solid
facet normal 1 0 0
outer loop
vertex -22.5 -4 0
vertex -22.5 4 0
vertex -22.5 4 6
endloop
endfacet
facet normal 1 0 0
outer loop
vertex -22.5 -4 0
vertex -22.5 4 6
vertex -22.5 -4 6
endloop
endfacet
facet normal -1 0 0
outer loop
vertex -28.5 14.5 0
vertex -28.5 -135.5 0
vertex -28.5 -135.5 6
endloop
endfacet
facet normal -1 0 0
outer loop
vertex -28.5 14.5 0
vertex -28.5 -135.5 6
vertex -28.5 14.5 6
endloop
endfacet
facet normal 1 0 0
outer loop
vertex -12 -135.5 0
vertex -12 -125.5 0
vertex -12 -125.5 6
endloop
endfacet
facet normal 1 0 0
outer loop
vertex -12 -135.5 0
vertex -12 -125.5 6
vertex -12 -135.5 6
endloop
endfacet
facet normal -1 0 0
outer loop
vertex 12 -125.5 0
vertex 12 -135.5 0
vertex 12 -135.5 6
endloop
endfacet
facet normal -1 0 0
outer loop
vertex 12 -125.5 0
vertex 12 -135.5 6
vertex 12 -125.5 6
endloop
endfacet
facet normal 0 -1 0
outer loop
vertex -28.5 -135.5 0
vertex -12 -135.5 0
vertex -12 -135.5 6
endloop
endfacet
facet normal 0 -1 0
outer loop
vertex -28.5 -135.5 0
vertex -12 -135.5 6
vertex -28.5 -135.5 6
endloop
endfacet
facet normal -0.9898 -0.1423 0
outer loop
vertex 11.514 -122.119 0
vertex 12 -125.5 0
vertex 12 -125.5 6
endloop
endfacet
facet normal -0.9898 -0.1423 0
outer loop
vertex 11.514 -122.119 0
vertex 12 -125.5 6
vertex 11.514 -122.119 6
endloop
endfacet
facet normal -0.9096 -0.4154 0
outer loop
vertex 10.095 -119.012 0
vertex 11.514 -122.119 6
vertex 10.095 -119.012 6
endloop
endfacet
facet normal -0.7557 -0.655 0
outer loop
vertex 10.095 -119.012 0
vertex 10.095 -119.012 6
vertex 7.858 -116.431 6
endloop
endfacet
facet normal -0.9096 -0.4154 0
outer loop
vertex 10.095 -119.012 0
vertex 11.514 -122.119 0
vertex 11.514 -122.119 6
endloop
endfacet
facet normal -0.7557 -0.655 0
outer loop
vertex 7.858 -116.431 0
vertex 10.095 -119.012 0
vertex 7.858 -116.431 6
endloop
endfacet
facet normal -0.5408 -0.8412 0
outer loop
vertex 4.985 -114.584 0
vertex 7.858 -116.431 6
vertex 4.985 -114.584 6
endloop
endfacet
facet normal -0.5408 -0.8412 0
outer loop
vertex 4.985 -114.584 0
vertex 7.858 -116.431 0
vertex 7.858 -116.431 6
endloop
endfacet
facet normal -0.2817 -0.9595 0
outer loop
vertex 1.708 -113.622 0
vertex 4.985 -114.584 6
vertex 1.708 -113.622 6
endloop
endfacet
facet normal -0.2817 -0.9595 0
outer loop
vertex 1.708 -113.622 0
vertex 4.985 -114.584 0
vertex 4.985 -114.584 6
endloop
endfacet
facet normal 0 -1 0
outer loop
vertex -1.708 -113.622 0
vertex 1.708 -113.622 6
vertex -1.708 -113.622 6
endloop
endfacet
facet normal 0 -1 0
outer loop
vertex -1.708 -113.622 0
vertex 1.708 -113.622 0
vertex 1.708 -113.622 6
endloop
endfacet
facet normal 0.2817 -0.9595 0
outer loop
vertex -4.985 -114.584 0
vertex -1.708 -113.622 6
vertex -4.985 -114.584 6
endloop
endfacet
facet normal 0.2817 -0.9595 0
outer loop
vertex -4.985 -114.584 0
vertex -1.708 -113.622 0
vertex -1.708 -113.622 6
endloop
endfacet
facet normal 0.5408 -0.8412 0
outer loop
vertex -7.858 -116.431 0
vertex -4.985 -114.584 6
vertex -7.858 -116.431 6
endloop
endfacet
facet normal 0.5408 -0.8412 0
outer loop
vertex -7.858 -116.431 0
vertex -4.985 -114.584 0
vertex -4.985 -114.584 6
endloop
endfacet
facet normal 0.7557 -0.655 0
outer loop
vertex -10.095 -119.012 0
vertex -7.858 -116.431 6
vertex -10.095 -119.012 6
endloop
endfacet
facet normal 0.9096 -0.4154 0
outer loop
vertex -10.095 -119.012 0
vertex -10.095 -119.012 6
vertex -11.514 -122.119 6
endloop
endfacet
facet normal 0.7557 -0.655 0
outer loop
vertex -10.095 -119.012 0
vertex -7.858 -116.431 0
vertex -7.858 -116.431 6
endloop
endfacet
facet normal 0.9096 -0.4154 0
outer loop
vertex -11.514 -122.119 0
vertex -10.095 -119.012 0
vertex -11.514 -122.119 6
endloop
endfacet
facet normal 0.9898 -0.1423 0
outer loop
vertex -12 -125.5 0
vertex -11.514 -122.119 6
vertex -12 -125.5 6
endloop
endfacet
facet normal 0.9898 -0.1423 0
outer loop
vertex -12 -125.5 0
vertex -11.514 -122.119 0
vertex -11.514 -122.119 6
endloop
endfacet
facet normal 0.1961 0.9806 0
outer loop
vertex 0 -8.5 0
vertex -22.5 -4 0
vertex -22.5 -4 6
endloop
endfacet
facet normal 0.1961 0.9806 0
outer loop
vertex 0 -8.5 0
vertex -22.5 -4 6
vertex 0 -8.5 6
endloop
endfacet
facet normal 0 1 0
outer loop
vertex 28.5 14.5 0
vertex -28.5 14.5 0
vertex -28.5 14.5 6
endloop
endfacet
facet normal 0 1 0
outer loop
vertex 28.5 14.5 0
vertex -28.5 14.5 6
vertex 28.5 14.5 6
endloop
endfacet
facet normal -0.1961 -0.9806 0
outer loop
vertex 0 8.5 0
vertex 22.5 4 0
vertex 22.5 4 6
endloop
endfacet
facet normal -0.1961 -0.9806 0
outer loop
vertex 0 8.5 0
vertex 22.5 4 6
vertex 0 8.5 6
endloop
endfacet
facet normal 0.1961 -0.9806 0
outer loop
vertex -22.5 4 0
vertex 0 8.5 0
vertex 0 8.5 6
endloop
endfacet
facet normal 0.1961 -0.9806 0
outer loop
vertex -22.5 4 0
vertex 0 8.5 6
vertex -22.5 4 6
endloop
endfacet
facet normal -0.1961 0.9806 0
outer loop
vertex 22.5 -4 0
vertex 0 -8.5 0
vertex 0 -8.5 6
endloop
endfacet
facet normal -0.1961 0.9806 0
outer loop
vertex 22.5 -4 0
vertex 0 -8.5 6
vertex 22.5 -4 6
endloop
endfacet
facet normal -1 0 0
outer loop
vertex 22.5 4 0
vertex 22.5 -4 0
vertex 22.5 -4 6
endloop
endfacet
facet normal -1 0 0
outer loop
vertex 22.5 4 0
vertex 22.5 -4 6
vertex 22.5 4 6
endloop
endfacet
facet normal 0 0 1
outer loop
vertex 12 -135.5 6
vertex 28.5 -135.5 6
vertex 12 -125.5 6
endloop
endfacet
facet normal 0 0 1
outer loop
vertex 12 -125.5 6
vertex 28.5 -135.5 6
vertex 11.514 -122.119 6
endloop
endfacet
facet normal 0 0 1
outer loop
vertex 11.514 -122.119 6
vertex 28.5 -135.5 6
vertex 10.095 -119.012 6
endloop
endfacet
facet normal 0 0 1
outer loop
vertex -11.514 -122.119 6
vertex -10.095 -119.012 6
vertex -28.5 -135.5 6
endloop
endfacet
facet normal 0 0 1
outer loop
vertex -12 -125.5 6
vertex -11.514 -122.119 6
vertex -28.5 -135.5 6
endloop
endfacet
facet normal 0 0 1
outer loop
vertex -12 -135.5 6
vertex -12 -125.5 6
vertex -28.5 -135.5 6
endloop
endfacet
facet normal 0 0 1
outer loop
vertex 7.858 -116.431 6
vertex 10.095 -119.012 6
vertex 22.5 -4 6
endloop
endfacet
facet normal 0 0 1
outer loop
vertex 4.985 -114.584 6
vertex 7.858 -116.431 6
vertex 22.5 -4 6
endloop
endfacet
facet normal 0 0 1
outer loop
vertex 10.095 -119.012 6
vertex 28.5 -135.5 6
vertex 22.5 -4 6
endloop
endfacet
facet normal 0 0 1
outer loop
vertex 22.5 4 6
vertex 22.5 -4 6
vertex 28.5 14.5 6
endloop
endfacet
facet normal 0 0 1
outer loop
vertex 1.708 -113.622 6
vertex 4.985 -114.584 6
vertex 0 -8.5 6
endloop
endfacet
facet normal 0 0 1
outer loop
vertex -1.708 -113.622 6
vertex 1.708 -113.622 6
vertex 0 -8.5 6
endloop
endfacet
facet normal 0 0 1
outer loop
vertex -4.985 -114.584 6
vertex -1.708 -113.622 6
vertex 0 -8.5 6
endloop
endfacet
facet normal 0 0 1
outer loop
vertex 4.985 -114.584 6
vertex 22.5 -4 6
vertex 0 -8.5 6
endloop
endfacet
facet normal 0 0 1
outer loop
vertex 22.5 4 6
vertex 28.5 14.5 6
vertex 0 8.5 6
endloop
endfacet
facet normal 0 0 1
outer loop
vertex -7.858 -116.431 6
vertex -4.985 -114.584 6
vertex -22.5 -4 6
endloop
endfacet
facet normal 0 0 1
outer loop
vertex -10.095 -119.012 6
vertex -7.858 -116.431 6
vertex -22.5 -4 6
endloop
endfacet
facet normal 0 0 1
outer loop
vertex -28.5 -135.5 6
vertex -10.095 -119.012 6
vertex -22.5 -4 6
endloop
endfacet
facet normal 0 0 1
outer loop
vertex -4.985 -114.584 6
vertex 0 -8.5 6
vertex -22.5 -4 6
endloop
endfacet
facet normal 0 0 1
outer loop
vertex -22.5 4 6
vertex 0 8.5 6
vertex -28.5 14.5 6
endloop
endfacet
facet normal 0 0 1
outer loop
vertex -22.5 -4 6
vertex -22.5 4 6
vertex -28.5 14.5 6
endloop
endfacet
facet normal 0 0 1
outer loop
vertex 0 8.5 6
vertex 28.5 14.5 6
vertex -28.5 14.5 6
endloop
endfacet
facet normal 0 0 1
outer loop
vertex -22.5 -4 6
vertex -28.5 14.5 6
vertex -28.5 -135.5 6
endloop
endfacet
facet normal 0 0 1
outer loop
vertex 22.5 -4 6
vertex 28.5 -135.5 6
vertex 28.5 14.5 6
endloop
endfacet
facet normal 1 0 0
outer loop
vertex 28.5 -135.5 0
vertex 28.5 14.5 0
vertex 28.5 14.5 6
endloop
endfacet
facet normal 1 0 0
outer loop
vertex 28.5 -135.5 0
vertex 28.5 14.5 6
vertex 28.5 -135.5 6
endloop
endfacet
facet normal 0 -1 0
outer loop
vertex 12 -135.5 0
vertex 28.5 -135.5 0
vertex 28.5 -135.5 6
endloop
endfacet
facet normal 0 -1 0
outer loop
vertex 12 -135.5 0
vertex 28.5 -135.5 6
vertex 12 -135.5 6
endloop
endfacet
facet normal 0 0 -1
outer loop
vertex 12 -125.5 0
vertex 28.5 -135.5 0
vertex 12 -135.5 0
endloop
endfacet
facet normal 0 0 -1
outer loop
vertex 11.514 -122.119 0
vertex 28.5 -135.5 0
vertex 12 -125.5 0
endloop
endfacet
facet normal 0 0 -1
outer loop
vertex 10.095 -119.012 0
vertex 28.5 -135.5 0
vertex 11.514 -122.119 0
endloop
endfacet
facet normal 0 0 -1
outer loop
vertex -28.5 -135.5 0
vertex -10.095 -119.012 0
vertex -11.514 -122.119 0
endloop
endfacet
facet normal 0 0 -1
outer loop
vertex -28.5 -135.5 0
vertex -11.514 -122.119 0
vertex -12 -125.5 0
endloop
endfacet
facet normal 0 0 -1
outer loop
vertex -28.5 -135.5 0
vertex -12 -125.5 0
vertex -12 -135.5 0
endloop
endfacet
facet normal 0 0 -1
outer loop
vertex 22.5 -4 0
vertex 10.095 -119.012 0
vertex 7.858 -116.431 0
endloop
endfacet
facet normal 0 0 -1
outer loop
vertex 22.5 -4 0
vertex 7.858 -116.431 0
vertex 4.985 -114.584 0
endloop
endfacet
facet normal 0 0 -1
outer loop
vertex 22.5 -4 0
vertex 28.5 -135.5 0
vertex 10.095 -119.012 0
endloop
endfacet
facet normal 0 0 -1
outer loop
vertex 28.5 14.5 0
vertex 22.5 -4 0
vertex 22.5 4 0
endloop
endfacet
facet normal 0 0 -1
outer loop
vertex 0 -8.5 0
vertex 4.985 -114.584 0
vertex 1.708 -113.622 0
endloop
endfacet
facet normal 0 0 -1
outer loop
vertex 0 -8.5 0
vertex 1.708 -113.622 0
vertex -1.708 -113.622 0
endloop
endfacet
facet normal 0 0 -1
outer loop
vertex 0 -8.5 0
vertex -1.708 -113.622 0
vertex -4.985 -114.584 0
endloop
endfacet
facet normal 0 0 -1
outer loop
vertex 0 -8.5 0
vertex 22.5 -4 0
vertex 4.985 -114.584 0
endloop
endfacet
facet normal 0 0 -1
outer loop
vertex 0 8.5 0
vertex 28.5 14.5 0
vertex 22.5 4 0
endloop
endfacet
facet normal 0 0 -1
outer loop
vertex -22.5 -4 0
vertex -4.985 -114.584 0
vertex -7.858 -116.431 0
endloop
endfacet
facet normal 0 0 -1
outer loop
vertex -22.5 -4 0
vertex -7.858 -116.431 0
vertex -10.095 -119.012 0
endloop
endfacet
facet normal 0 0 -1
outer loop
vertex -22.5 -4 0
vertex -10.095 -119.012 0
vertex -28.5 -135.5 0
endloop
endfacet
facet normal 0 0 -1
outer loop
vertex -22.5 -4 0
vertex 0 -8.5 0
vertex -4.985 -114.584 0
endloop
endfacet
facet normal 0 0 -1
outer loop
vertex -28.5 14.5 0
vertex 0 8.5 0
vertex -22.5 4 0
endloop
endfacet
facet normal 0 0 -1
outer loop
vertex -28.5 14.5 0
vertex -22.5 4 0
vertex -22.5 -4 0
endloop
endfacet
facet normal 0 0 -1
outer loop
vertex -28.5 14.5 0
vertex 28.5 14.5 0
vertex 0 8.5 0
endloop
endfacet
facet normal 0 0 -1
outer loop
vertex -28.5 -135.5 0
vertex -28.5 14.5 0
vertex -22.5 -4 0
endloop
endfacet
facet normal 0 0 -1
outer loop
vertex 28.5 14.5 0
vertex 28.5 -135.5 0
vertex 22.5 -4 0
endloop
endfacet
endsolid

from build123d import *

# Parameters (mm, degrees)
PAD_DEPTH = 6


with BuildPart() as part:
    # Sketch → Pad (new body)
    with BuildSketch(Plane.XY):
        with BuildLine():
            ThreePointArc((12, -125.5), (0, -113.5), (-12, -125.5))
            Line((-12, -125.5), (-12, -135.5))
            Line((-12, -135.5), (-28.5, -135.5))
            Line((-28.5, -135.5), (-28.5, 14.5))
            Line((-28.5, 14.5), (28.5, 14.5))
            Line((28.5, 14.5), (28.5, -135.5))
            Line((28.5, -135.5), (12, -135.5))
            Line((12, -135.5), (12, -125.5))
        make_face()
        Polygon((0, 8.5), (-22.5, 4), (-22.5, -4), (0, -8.5), (22.5, -4), (22.5, 4), align=None, mode=Mode.SUBTRACT)
    extrude(amount=PAD_DEPTH)


solid = part.part
